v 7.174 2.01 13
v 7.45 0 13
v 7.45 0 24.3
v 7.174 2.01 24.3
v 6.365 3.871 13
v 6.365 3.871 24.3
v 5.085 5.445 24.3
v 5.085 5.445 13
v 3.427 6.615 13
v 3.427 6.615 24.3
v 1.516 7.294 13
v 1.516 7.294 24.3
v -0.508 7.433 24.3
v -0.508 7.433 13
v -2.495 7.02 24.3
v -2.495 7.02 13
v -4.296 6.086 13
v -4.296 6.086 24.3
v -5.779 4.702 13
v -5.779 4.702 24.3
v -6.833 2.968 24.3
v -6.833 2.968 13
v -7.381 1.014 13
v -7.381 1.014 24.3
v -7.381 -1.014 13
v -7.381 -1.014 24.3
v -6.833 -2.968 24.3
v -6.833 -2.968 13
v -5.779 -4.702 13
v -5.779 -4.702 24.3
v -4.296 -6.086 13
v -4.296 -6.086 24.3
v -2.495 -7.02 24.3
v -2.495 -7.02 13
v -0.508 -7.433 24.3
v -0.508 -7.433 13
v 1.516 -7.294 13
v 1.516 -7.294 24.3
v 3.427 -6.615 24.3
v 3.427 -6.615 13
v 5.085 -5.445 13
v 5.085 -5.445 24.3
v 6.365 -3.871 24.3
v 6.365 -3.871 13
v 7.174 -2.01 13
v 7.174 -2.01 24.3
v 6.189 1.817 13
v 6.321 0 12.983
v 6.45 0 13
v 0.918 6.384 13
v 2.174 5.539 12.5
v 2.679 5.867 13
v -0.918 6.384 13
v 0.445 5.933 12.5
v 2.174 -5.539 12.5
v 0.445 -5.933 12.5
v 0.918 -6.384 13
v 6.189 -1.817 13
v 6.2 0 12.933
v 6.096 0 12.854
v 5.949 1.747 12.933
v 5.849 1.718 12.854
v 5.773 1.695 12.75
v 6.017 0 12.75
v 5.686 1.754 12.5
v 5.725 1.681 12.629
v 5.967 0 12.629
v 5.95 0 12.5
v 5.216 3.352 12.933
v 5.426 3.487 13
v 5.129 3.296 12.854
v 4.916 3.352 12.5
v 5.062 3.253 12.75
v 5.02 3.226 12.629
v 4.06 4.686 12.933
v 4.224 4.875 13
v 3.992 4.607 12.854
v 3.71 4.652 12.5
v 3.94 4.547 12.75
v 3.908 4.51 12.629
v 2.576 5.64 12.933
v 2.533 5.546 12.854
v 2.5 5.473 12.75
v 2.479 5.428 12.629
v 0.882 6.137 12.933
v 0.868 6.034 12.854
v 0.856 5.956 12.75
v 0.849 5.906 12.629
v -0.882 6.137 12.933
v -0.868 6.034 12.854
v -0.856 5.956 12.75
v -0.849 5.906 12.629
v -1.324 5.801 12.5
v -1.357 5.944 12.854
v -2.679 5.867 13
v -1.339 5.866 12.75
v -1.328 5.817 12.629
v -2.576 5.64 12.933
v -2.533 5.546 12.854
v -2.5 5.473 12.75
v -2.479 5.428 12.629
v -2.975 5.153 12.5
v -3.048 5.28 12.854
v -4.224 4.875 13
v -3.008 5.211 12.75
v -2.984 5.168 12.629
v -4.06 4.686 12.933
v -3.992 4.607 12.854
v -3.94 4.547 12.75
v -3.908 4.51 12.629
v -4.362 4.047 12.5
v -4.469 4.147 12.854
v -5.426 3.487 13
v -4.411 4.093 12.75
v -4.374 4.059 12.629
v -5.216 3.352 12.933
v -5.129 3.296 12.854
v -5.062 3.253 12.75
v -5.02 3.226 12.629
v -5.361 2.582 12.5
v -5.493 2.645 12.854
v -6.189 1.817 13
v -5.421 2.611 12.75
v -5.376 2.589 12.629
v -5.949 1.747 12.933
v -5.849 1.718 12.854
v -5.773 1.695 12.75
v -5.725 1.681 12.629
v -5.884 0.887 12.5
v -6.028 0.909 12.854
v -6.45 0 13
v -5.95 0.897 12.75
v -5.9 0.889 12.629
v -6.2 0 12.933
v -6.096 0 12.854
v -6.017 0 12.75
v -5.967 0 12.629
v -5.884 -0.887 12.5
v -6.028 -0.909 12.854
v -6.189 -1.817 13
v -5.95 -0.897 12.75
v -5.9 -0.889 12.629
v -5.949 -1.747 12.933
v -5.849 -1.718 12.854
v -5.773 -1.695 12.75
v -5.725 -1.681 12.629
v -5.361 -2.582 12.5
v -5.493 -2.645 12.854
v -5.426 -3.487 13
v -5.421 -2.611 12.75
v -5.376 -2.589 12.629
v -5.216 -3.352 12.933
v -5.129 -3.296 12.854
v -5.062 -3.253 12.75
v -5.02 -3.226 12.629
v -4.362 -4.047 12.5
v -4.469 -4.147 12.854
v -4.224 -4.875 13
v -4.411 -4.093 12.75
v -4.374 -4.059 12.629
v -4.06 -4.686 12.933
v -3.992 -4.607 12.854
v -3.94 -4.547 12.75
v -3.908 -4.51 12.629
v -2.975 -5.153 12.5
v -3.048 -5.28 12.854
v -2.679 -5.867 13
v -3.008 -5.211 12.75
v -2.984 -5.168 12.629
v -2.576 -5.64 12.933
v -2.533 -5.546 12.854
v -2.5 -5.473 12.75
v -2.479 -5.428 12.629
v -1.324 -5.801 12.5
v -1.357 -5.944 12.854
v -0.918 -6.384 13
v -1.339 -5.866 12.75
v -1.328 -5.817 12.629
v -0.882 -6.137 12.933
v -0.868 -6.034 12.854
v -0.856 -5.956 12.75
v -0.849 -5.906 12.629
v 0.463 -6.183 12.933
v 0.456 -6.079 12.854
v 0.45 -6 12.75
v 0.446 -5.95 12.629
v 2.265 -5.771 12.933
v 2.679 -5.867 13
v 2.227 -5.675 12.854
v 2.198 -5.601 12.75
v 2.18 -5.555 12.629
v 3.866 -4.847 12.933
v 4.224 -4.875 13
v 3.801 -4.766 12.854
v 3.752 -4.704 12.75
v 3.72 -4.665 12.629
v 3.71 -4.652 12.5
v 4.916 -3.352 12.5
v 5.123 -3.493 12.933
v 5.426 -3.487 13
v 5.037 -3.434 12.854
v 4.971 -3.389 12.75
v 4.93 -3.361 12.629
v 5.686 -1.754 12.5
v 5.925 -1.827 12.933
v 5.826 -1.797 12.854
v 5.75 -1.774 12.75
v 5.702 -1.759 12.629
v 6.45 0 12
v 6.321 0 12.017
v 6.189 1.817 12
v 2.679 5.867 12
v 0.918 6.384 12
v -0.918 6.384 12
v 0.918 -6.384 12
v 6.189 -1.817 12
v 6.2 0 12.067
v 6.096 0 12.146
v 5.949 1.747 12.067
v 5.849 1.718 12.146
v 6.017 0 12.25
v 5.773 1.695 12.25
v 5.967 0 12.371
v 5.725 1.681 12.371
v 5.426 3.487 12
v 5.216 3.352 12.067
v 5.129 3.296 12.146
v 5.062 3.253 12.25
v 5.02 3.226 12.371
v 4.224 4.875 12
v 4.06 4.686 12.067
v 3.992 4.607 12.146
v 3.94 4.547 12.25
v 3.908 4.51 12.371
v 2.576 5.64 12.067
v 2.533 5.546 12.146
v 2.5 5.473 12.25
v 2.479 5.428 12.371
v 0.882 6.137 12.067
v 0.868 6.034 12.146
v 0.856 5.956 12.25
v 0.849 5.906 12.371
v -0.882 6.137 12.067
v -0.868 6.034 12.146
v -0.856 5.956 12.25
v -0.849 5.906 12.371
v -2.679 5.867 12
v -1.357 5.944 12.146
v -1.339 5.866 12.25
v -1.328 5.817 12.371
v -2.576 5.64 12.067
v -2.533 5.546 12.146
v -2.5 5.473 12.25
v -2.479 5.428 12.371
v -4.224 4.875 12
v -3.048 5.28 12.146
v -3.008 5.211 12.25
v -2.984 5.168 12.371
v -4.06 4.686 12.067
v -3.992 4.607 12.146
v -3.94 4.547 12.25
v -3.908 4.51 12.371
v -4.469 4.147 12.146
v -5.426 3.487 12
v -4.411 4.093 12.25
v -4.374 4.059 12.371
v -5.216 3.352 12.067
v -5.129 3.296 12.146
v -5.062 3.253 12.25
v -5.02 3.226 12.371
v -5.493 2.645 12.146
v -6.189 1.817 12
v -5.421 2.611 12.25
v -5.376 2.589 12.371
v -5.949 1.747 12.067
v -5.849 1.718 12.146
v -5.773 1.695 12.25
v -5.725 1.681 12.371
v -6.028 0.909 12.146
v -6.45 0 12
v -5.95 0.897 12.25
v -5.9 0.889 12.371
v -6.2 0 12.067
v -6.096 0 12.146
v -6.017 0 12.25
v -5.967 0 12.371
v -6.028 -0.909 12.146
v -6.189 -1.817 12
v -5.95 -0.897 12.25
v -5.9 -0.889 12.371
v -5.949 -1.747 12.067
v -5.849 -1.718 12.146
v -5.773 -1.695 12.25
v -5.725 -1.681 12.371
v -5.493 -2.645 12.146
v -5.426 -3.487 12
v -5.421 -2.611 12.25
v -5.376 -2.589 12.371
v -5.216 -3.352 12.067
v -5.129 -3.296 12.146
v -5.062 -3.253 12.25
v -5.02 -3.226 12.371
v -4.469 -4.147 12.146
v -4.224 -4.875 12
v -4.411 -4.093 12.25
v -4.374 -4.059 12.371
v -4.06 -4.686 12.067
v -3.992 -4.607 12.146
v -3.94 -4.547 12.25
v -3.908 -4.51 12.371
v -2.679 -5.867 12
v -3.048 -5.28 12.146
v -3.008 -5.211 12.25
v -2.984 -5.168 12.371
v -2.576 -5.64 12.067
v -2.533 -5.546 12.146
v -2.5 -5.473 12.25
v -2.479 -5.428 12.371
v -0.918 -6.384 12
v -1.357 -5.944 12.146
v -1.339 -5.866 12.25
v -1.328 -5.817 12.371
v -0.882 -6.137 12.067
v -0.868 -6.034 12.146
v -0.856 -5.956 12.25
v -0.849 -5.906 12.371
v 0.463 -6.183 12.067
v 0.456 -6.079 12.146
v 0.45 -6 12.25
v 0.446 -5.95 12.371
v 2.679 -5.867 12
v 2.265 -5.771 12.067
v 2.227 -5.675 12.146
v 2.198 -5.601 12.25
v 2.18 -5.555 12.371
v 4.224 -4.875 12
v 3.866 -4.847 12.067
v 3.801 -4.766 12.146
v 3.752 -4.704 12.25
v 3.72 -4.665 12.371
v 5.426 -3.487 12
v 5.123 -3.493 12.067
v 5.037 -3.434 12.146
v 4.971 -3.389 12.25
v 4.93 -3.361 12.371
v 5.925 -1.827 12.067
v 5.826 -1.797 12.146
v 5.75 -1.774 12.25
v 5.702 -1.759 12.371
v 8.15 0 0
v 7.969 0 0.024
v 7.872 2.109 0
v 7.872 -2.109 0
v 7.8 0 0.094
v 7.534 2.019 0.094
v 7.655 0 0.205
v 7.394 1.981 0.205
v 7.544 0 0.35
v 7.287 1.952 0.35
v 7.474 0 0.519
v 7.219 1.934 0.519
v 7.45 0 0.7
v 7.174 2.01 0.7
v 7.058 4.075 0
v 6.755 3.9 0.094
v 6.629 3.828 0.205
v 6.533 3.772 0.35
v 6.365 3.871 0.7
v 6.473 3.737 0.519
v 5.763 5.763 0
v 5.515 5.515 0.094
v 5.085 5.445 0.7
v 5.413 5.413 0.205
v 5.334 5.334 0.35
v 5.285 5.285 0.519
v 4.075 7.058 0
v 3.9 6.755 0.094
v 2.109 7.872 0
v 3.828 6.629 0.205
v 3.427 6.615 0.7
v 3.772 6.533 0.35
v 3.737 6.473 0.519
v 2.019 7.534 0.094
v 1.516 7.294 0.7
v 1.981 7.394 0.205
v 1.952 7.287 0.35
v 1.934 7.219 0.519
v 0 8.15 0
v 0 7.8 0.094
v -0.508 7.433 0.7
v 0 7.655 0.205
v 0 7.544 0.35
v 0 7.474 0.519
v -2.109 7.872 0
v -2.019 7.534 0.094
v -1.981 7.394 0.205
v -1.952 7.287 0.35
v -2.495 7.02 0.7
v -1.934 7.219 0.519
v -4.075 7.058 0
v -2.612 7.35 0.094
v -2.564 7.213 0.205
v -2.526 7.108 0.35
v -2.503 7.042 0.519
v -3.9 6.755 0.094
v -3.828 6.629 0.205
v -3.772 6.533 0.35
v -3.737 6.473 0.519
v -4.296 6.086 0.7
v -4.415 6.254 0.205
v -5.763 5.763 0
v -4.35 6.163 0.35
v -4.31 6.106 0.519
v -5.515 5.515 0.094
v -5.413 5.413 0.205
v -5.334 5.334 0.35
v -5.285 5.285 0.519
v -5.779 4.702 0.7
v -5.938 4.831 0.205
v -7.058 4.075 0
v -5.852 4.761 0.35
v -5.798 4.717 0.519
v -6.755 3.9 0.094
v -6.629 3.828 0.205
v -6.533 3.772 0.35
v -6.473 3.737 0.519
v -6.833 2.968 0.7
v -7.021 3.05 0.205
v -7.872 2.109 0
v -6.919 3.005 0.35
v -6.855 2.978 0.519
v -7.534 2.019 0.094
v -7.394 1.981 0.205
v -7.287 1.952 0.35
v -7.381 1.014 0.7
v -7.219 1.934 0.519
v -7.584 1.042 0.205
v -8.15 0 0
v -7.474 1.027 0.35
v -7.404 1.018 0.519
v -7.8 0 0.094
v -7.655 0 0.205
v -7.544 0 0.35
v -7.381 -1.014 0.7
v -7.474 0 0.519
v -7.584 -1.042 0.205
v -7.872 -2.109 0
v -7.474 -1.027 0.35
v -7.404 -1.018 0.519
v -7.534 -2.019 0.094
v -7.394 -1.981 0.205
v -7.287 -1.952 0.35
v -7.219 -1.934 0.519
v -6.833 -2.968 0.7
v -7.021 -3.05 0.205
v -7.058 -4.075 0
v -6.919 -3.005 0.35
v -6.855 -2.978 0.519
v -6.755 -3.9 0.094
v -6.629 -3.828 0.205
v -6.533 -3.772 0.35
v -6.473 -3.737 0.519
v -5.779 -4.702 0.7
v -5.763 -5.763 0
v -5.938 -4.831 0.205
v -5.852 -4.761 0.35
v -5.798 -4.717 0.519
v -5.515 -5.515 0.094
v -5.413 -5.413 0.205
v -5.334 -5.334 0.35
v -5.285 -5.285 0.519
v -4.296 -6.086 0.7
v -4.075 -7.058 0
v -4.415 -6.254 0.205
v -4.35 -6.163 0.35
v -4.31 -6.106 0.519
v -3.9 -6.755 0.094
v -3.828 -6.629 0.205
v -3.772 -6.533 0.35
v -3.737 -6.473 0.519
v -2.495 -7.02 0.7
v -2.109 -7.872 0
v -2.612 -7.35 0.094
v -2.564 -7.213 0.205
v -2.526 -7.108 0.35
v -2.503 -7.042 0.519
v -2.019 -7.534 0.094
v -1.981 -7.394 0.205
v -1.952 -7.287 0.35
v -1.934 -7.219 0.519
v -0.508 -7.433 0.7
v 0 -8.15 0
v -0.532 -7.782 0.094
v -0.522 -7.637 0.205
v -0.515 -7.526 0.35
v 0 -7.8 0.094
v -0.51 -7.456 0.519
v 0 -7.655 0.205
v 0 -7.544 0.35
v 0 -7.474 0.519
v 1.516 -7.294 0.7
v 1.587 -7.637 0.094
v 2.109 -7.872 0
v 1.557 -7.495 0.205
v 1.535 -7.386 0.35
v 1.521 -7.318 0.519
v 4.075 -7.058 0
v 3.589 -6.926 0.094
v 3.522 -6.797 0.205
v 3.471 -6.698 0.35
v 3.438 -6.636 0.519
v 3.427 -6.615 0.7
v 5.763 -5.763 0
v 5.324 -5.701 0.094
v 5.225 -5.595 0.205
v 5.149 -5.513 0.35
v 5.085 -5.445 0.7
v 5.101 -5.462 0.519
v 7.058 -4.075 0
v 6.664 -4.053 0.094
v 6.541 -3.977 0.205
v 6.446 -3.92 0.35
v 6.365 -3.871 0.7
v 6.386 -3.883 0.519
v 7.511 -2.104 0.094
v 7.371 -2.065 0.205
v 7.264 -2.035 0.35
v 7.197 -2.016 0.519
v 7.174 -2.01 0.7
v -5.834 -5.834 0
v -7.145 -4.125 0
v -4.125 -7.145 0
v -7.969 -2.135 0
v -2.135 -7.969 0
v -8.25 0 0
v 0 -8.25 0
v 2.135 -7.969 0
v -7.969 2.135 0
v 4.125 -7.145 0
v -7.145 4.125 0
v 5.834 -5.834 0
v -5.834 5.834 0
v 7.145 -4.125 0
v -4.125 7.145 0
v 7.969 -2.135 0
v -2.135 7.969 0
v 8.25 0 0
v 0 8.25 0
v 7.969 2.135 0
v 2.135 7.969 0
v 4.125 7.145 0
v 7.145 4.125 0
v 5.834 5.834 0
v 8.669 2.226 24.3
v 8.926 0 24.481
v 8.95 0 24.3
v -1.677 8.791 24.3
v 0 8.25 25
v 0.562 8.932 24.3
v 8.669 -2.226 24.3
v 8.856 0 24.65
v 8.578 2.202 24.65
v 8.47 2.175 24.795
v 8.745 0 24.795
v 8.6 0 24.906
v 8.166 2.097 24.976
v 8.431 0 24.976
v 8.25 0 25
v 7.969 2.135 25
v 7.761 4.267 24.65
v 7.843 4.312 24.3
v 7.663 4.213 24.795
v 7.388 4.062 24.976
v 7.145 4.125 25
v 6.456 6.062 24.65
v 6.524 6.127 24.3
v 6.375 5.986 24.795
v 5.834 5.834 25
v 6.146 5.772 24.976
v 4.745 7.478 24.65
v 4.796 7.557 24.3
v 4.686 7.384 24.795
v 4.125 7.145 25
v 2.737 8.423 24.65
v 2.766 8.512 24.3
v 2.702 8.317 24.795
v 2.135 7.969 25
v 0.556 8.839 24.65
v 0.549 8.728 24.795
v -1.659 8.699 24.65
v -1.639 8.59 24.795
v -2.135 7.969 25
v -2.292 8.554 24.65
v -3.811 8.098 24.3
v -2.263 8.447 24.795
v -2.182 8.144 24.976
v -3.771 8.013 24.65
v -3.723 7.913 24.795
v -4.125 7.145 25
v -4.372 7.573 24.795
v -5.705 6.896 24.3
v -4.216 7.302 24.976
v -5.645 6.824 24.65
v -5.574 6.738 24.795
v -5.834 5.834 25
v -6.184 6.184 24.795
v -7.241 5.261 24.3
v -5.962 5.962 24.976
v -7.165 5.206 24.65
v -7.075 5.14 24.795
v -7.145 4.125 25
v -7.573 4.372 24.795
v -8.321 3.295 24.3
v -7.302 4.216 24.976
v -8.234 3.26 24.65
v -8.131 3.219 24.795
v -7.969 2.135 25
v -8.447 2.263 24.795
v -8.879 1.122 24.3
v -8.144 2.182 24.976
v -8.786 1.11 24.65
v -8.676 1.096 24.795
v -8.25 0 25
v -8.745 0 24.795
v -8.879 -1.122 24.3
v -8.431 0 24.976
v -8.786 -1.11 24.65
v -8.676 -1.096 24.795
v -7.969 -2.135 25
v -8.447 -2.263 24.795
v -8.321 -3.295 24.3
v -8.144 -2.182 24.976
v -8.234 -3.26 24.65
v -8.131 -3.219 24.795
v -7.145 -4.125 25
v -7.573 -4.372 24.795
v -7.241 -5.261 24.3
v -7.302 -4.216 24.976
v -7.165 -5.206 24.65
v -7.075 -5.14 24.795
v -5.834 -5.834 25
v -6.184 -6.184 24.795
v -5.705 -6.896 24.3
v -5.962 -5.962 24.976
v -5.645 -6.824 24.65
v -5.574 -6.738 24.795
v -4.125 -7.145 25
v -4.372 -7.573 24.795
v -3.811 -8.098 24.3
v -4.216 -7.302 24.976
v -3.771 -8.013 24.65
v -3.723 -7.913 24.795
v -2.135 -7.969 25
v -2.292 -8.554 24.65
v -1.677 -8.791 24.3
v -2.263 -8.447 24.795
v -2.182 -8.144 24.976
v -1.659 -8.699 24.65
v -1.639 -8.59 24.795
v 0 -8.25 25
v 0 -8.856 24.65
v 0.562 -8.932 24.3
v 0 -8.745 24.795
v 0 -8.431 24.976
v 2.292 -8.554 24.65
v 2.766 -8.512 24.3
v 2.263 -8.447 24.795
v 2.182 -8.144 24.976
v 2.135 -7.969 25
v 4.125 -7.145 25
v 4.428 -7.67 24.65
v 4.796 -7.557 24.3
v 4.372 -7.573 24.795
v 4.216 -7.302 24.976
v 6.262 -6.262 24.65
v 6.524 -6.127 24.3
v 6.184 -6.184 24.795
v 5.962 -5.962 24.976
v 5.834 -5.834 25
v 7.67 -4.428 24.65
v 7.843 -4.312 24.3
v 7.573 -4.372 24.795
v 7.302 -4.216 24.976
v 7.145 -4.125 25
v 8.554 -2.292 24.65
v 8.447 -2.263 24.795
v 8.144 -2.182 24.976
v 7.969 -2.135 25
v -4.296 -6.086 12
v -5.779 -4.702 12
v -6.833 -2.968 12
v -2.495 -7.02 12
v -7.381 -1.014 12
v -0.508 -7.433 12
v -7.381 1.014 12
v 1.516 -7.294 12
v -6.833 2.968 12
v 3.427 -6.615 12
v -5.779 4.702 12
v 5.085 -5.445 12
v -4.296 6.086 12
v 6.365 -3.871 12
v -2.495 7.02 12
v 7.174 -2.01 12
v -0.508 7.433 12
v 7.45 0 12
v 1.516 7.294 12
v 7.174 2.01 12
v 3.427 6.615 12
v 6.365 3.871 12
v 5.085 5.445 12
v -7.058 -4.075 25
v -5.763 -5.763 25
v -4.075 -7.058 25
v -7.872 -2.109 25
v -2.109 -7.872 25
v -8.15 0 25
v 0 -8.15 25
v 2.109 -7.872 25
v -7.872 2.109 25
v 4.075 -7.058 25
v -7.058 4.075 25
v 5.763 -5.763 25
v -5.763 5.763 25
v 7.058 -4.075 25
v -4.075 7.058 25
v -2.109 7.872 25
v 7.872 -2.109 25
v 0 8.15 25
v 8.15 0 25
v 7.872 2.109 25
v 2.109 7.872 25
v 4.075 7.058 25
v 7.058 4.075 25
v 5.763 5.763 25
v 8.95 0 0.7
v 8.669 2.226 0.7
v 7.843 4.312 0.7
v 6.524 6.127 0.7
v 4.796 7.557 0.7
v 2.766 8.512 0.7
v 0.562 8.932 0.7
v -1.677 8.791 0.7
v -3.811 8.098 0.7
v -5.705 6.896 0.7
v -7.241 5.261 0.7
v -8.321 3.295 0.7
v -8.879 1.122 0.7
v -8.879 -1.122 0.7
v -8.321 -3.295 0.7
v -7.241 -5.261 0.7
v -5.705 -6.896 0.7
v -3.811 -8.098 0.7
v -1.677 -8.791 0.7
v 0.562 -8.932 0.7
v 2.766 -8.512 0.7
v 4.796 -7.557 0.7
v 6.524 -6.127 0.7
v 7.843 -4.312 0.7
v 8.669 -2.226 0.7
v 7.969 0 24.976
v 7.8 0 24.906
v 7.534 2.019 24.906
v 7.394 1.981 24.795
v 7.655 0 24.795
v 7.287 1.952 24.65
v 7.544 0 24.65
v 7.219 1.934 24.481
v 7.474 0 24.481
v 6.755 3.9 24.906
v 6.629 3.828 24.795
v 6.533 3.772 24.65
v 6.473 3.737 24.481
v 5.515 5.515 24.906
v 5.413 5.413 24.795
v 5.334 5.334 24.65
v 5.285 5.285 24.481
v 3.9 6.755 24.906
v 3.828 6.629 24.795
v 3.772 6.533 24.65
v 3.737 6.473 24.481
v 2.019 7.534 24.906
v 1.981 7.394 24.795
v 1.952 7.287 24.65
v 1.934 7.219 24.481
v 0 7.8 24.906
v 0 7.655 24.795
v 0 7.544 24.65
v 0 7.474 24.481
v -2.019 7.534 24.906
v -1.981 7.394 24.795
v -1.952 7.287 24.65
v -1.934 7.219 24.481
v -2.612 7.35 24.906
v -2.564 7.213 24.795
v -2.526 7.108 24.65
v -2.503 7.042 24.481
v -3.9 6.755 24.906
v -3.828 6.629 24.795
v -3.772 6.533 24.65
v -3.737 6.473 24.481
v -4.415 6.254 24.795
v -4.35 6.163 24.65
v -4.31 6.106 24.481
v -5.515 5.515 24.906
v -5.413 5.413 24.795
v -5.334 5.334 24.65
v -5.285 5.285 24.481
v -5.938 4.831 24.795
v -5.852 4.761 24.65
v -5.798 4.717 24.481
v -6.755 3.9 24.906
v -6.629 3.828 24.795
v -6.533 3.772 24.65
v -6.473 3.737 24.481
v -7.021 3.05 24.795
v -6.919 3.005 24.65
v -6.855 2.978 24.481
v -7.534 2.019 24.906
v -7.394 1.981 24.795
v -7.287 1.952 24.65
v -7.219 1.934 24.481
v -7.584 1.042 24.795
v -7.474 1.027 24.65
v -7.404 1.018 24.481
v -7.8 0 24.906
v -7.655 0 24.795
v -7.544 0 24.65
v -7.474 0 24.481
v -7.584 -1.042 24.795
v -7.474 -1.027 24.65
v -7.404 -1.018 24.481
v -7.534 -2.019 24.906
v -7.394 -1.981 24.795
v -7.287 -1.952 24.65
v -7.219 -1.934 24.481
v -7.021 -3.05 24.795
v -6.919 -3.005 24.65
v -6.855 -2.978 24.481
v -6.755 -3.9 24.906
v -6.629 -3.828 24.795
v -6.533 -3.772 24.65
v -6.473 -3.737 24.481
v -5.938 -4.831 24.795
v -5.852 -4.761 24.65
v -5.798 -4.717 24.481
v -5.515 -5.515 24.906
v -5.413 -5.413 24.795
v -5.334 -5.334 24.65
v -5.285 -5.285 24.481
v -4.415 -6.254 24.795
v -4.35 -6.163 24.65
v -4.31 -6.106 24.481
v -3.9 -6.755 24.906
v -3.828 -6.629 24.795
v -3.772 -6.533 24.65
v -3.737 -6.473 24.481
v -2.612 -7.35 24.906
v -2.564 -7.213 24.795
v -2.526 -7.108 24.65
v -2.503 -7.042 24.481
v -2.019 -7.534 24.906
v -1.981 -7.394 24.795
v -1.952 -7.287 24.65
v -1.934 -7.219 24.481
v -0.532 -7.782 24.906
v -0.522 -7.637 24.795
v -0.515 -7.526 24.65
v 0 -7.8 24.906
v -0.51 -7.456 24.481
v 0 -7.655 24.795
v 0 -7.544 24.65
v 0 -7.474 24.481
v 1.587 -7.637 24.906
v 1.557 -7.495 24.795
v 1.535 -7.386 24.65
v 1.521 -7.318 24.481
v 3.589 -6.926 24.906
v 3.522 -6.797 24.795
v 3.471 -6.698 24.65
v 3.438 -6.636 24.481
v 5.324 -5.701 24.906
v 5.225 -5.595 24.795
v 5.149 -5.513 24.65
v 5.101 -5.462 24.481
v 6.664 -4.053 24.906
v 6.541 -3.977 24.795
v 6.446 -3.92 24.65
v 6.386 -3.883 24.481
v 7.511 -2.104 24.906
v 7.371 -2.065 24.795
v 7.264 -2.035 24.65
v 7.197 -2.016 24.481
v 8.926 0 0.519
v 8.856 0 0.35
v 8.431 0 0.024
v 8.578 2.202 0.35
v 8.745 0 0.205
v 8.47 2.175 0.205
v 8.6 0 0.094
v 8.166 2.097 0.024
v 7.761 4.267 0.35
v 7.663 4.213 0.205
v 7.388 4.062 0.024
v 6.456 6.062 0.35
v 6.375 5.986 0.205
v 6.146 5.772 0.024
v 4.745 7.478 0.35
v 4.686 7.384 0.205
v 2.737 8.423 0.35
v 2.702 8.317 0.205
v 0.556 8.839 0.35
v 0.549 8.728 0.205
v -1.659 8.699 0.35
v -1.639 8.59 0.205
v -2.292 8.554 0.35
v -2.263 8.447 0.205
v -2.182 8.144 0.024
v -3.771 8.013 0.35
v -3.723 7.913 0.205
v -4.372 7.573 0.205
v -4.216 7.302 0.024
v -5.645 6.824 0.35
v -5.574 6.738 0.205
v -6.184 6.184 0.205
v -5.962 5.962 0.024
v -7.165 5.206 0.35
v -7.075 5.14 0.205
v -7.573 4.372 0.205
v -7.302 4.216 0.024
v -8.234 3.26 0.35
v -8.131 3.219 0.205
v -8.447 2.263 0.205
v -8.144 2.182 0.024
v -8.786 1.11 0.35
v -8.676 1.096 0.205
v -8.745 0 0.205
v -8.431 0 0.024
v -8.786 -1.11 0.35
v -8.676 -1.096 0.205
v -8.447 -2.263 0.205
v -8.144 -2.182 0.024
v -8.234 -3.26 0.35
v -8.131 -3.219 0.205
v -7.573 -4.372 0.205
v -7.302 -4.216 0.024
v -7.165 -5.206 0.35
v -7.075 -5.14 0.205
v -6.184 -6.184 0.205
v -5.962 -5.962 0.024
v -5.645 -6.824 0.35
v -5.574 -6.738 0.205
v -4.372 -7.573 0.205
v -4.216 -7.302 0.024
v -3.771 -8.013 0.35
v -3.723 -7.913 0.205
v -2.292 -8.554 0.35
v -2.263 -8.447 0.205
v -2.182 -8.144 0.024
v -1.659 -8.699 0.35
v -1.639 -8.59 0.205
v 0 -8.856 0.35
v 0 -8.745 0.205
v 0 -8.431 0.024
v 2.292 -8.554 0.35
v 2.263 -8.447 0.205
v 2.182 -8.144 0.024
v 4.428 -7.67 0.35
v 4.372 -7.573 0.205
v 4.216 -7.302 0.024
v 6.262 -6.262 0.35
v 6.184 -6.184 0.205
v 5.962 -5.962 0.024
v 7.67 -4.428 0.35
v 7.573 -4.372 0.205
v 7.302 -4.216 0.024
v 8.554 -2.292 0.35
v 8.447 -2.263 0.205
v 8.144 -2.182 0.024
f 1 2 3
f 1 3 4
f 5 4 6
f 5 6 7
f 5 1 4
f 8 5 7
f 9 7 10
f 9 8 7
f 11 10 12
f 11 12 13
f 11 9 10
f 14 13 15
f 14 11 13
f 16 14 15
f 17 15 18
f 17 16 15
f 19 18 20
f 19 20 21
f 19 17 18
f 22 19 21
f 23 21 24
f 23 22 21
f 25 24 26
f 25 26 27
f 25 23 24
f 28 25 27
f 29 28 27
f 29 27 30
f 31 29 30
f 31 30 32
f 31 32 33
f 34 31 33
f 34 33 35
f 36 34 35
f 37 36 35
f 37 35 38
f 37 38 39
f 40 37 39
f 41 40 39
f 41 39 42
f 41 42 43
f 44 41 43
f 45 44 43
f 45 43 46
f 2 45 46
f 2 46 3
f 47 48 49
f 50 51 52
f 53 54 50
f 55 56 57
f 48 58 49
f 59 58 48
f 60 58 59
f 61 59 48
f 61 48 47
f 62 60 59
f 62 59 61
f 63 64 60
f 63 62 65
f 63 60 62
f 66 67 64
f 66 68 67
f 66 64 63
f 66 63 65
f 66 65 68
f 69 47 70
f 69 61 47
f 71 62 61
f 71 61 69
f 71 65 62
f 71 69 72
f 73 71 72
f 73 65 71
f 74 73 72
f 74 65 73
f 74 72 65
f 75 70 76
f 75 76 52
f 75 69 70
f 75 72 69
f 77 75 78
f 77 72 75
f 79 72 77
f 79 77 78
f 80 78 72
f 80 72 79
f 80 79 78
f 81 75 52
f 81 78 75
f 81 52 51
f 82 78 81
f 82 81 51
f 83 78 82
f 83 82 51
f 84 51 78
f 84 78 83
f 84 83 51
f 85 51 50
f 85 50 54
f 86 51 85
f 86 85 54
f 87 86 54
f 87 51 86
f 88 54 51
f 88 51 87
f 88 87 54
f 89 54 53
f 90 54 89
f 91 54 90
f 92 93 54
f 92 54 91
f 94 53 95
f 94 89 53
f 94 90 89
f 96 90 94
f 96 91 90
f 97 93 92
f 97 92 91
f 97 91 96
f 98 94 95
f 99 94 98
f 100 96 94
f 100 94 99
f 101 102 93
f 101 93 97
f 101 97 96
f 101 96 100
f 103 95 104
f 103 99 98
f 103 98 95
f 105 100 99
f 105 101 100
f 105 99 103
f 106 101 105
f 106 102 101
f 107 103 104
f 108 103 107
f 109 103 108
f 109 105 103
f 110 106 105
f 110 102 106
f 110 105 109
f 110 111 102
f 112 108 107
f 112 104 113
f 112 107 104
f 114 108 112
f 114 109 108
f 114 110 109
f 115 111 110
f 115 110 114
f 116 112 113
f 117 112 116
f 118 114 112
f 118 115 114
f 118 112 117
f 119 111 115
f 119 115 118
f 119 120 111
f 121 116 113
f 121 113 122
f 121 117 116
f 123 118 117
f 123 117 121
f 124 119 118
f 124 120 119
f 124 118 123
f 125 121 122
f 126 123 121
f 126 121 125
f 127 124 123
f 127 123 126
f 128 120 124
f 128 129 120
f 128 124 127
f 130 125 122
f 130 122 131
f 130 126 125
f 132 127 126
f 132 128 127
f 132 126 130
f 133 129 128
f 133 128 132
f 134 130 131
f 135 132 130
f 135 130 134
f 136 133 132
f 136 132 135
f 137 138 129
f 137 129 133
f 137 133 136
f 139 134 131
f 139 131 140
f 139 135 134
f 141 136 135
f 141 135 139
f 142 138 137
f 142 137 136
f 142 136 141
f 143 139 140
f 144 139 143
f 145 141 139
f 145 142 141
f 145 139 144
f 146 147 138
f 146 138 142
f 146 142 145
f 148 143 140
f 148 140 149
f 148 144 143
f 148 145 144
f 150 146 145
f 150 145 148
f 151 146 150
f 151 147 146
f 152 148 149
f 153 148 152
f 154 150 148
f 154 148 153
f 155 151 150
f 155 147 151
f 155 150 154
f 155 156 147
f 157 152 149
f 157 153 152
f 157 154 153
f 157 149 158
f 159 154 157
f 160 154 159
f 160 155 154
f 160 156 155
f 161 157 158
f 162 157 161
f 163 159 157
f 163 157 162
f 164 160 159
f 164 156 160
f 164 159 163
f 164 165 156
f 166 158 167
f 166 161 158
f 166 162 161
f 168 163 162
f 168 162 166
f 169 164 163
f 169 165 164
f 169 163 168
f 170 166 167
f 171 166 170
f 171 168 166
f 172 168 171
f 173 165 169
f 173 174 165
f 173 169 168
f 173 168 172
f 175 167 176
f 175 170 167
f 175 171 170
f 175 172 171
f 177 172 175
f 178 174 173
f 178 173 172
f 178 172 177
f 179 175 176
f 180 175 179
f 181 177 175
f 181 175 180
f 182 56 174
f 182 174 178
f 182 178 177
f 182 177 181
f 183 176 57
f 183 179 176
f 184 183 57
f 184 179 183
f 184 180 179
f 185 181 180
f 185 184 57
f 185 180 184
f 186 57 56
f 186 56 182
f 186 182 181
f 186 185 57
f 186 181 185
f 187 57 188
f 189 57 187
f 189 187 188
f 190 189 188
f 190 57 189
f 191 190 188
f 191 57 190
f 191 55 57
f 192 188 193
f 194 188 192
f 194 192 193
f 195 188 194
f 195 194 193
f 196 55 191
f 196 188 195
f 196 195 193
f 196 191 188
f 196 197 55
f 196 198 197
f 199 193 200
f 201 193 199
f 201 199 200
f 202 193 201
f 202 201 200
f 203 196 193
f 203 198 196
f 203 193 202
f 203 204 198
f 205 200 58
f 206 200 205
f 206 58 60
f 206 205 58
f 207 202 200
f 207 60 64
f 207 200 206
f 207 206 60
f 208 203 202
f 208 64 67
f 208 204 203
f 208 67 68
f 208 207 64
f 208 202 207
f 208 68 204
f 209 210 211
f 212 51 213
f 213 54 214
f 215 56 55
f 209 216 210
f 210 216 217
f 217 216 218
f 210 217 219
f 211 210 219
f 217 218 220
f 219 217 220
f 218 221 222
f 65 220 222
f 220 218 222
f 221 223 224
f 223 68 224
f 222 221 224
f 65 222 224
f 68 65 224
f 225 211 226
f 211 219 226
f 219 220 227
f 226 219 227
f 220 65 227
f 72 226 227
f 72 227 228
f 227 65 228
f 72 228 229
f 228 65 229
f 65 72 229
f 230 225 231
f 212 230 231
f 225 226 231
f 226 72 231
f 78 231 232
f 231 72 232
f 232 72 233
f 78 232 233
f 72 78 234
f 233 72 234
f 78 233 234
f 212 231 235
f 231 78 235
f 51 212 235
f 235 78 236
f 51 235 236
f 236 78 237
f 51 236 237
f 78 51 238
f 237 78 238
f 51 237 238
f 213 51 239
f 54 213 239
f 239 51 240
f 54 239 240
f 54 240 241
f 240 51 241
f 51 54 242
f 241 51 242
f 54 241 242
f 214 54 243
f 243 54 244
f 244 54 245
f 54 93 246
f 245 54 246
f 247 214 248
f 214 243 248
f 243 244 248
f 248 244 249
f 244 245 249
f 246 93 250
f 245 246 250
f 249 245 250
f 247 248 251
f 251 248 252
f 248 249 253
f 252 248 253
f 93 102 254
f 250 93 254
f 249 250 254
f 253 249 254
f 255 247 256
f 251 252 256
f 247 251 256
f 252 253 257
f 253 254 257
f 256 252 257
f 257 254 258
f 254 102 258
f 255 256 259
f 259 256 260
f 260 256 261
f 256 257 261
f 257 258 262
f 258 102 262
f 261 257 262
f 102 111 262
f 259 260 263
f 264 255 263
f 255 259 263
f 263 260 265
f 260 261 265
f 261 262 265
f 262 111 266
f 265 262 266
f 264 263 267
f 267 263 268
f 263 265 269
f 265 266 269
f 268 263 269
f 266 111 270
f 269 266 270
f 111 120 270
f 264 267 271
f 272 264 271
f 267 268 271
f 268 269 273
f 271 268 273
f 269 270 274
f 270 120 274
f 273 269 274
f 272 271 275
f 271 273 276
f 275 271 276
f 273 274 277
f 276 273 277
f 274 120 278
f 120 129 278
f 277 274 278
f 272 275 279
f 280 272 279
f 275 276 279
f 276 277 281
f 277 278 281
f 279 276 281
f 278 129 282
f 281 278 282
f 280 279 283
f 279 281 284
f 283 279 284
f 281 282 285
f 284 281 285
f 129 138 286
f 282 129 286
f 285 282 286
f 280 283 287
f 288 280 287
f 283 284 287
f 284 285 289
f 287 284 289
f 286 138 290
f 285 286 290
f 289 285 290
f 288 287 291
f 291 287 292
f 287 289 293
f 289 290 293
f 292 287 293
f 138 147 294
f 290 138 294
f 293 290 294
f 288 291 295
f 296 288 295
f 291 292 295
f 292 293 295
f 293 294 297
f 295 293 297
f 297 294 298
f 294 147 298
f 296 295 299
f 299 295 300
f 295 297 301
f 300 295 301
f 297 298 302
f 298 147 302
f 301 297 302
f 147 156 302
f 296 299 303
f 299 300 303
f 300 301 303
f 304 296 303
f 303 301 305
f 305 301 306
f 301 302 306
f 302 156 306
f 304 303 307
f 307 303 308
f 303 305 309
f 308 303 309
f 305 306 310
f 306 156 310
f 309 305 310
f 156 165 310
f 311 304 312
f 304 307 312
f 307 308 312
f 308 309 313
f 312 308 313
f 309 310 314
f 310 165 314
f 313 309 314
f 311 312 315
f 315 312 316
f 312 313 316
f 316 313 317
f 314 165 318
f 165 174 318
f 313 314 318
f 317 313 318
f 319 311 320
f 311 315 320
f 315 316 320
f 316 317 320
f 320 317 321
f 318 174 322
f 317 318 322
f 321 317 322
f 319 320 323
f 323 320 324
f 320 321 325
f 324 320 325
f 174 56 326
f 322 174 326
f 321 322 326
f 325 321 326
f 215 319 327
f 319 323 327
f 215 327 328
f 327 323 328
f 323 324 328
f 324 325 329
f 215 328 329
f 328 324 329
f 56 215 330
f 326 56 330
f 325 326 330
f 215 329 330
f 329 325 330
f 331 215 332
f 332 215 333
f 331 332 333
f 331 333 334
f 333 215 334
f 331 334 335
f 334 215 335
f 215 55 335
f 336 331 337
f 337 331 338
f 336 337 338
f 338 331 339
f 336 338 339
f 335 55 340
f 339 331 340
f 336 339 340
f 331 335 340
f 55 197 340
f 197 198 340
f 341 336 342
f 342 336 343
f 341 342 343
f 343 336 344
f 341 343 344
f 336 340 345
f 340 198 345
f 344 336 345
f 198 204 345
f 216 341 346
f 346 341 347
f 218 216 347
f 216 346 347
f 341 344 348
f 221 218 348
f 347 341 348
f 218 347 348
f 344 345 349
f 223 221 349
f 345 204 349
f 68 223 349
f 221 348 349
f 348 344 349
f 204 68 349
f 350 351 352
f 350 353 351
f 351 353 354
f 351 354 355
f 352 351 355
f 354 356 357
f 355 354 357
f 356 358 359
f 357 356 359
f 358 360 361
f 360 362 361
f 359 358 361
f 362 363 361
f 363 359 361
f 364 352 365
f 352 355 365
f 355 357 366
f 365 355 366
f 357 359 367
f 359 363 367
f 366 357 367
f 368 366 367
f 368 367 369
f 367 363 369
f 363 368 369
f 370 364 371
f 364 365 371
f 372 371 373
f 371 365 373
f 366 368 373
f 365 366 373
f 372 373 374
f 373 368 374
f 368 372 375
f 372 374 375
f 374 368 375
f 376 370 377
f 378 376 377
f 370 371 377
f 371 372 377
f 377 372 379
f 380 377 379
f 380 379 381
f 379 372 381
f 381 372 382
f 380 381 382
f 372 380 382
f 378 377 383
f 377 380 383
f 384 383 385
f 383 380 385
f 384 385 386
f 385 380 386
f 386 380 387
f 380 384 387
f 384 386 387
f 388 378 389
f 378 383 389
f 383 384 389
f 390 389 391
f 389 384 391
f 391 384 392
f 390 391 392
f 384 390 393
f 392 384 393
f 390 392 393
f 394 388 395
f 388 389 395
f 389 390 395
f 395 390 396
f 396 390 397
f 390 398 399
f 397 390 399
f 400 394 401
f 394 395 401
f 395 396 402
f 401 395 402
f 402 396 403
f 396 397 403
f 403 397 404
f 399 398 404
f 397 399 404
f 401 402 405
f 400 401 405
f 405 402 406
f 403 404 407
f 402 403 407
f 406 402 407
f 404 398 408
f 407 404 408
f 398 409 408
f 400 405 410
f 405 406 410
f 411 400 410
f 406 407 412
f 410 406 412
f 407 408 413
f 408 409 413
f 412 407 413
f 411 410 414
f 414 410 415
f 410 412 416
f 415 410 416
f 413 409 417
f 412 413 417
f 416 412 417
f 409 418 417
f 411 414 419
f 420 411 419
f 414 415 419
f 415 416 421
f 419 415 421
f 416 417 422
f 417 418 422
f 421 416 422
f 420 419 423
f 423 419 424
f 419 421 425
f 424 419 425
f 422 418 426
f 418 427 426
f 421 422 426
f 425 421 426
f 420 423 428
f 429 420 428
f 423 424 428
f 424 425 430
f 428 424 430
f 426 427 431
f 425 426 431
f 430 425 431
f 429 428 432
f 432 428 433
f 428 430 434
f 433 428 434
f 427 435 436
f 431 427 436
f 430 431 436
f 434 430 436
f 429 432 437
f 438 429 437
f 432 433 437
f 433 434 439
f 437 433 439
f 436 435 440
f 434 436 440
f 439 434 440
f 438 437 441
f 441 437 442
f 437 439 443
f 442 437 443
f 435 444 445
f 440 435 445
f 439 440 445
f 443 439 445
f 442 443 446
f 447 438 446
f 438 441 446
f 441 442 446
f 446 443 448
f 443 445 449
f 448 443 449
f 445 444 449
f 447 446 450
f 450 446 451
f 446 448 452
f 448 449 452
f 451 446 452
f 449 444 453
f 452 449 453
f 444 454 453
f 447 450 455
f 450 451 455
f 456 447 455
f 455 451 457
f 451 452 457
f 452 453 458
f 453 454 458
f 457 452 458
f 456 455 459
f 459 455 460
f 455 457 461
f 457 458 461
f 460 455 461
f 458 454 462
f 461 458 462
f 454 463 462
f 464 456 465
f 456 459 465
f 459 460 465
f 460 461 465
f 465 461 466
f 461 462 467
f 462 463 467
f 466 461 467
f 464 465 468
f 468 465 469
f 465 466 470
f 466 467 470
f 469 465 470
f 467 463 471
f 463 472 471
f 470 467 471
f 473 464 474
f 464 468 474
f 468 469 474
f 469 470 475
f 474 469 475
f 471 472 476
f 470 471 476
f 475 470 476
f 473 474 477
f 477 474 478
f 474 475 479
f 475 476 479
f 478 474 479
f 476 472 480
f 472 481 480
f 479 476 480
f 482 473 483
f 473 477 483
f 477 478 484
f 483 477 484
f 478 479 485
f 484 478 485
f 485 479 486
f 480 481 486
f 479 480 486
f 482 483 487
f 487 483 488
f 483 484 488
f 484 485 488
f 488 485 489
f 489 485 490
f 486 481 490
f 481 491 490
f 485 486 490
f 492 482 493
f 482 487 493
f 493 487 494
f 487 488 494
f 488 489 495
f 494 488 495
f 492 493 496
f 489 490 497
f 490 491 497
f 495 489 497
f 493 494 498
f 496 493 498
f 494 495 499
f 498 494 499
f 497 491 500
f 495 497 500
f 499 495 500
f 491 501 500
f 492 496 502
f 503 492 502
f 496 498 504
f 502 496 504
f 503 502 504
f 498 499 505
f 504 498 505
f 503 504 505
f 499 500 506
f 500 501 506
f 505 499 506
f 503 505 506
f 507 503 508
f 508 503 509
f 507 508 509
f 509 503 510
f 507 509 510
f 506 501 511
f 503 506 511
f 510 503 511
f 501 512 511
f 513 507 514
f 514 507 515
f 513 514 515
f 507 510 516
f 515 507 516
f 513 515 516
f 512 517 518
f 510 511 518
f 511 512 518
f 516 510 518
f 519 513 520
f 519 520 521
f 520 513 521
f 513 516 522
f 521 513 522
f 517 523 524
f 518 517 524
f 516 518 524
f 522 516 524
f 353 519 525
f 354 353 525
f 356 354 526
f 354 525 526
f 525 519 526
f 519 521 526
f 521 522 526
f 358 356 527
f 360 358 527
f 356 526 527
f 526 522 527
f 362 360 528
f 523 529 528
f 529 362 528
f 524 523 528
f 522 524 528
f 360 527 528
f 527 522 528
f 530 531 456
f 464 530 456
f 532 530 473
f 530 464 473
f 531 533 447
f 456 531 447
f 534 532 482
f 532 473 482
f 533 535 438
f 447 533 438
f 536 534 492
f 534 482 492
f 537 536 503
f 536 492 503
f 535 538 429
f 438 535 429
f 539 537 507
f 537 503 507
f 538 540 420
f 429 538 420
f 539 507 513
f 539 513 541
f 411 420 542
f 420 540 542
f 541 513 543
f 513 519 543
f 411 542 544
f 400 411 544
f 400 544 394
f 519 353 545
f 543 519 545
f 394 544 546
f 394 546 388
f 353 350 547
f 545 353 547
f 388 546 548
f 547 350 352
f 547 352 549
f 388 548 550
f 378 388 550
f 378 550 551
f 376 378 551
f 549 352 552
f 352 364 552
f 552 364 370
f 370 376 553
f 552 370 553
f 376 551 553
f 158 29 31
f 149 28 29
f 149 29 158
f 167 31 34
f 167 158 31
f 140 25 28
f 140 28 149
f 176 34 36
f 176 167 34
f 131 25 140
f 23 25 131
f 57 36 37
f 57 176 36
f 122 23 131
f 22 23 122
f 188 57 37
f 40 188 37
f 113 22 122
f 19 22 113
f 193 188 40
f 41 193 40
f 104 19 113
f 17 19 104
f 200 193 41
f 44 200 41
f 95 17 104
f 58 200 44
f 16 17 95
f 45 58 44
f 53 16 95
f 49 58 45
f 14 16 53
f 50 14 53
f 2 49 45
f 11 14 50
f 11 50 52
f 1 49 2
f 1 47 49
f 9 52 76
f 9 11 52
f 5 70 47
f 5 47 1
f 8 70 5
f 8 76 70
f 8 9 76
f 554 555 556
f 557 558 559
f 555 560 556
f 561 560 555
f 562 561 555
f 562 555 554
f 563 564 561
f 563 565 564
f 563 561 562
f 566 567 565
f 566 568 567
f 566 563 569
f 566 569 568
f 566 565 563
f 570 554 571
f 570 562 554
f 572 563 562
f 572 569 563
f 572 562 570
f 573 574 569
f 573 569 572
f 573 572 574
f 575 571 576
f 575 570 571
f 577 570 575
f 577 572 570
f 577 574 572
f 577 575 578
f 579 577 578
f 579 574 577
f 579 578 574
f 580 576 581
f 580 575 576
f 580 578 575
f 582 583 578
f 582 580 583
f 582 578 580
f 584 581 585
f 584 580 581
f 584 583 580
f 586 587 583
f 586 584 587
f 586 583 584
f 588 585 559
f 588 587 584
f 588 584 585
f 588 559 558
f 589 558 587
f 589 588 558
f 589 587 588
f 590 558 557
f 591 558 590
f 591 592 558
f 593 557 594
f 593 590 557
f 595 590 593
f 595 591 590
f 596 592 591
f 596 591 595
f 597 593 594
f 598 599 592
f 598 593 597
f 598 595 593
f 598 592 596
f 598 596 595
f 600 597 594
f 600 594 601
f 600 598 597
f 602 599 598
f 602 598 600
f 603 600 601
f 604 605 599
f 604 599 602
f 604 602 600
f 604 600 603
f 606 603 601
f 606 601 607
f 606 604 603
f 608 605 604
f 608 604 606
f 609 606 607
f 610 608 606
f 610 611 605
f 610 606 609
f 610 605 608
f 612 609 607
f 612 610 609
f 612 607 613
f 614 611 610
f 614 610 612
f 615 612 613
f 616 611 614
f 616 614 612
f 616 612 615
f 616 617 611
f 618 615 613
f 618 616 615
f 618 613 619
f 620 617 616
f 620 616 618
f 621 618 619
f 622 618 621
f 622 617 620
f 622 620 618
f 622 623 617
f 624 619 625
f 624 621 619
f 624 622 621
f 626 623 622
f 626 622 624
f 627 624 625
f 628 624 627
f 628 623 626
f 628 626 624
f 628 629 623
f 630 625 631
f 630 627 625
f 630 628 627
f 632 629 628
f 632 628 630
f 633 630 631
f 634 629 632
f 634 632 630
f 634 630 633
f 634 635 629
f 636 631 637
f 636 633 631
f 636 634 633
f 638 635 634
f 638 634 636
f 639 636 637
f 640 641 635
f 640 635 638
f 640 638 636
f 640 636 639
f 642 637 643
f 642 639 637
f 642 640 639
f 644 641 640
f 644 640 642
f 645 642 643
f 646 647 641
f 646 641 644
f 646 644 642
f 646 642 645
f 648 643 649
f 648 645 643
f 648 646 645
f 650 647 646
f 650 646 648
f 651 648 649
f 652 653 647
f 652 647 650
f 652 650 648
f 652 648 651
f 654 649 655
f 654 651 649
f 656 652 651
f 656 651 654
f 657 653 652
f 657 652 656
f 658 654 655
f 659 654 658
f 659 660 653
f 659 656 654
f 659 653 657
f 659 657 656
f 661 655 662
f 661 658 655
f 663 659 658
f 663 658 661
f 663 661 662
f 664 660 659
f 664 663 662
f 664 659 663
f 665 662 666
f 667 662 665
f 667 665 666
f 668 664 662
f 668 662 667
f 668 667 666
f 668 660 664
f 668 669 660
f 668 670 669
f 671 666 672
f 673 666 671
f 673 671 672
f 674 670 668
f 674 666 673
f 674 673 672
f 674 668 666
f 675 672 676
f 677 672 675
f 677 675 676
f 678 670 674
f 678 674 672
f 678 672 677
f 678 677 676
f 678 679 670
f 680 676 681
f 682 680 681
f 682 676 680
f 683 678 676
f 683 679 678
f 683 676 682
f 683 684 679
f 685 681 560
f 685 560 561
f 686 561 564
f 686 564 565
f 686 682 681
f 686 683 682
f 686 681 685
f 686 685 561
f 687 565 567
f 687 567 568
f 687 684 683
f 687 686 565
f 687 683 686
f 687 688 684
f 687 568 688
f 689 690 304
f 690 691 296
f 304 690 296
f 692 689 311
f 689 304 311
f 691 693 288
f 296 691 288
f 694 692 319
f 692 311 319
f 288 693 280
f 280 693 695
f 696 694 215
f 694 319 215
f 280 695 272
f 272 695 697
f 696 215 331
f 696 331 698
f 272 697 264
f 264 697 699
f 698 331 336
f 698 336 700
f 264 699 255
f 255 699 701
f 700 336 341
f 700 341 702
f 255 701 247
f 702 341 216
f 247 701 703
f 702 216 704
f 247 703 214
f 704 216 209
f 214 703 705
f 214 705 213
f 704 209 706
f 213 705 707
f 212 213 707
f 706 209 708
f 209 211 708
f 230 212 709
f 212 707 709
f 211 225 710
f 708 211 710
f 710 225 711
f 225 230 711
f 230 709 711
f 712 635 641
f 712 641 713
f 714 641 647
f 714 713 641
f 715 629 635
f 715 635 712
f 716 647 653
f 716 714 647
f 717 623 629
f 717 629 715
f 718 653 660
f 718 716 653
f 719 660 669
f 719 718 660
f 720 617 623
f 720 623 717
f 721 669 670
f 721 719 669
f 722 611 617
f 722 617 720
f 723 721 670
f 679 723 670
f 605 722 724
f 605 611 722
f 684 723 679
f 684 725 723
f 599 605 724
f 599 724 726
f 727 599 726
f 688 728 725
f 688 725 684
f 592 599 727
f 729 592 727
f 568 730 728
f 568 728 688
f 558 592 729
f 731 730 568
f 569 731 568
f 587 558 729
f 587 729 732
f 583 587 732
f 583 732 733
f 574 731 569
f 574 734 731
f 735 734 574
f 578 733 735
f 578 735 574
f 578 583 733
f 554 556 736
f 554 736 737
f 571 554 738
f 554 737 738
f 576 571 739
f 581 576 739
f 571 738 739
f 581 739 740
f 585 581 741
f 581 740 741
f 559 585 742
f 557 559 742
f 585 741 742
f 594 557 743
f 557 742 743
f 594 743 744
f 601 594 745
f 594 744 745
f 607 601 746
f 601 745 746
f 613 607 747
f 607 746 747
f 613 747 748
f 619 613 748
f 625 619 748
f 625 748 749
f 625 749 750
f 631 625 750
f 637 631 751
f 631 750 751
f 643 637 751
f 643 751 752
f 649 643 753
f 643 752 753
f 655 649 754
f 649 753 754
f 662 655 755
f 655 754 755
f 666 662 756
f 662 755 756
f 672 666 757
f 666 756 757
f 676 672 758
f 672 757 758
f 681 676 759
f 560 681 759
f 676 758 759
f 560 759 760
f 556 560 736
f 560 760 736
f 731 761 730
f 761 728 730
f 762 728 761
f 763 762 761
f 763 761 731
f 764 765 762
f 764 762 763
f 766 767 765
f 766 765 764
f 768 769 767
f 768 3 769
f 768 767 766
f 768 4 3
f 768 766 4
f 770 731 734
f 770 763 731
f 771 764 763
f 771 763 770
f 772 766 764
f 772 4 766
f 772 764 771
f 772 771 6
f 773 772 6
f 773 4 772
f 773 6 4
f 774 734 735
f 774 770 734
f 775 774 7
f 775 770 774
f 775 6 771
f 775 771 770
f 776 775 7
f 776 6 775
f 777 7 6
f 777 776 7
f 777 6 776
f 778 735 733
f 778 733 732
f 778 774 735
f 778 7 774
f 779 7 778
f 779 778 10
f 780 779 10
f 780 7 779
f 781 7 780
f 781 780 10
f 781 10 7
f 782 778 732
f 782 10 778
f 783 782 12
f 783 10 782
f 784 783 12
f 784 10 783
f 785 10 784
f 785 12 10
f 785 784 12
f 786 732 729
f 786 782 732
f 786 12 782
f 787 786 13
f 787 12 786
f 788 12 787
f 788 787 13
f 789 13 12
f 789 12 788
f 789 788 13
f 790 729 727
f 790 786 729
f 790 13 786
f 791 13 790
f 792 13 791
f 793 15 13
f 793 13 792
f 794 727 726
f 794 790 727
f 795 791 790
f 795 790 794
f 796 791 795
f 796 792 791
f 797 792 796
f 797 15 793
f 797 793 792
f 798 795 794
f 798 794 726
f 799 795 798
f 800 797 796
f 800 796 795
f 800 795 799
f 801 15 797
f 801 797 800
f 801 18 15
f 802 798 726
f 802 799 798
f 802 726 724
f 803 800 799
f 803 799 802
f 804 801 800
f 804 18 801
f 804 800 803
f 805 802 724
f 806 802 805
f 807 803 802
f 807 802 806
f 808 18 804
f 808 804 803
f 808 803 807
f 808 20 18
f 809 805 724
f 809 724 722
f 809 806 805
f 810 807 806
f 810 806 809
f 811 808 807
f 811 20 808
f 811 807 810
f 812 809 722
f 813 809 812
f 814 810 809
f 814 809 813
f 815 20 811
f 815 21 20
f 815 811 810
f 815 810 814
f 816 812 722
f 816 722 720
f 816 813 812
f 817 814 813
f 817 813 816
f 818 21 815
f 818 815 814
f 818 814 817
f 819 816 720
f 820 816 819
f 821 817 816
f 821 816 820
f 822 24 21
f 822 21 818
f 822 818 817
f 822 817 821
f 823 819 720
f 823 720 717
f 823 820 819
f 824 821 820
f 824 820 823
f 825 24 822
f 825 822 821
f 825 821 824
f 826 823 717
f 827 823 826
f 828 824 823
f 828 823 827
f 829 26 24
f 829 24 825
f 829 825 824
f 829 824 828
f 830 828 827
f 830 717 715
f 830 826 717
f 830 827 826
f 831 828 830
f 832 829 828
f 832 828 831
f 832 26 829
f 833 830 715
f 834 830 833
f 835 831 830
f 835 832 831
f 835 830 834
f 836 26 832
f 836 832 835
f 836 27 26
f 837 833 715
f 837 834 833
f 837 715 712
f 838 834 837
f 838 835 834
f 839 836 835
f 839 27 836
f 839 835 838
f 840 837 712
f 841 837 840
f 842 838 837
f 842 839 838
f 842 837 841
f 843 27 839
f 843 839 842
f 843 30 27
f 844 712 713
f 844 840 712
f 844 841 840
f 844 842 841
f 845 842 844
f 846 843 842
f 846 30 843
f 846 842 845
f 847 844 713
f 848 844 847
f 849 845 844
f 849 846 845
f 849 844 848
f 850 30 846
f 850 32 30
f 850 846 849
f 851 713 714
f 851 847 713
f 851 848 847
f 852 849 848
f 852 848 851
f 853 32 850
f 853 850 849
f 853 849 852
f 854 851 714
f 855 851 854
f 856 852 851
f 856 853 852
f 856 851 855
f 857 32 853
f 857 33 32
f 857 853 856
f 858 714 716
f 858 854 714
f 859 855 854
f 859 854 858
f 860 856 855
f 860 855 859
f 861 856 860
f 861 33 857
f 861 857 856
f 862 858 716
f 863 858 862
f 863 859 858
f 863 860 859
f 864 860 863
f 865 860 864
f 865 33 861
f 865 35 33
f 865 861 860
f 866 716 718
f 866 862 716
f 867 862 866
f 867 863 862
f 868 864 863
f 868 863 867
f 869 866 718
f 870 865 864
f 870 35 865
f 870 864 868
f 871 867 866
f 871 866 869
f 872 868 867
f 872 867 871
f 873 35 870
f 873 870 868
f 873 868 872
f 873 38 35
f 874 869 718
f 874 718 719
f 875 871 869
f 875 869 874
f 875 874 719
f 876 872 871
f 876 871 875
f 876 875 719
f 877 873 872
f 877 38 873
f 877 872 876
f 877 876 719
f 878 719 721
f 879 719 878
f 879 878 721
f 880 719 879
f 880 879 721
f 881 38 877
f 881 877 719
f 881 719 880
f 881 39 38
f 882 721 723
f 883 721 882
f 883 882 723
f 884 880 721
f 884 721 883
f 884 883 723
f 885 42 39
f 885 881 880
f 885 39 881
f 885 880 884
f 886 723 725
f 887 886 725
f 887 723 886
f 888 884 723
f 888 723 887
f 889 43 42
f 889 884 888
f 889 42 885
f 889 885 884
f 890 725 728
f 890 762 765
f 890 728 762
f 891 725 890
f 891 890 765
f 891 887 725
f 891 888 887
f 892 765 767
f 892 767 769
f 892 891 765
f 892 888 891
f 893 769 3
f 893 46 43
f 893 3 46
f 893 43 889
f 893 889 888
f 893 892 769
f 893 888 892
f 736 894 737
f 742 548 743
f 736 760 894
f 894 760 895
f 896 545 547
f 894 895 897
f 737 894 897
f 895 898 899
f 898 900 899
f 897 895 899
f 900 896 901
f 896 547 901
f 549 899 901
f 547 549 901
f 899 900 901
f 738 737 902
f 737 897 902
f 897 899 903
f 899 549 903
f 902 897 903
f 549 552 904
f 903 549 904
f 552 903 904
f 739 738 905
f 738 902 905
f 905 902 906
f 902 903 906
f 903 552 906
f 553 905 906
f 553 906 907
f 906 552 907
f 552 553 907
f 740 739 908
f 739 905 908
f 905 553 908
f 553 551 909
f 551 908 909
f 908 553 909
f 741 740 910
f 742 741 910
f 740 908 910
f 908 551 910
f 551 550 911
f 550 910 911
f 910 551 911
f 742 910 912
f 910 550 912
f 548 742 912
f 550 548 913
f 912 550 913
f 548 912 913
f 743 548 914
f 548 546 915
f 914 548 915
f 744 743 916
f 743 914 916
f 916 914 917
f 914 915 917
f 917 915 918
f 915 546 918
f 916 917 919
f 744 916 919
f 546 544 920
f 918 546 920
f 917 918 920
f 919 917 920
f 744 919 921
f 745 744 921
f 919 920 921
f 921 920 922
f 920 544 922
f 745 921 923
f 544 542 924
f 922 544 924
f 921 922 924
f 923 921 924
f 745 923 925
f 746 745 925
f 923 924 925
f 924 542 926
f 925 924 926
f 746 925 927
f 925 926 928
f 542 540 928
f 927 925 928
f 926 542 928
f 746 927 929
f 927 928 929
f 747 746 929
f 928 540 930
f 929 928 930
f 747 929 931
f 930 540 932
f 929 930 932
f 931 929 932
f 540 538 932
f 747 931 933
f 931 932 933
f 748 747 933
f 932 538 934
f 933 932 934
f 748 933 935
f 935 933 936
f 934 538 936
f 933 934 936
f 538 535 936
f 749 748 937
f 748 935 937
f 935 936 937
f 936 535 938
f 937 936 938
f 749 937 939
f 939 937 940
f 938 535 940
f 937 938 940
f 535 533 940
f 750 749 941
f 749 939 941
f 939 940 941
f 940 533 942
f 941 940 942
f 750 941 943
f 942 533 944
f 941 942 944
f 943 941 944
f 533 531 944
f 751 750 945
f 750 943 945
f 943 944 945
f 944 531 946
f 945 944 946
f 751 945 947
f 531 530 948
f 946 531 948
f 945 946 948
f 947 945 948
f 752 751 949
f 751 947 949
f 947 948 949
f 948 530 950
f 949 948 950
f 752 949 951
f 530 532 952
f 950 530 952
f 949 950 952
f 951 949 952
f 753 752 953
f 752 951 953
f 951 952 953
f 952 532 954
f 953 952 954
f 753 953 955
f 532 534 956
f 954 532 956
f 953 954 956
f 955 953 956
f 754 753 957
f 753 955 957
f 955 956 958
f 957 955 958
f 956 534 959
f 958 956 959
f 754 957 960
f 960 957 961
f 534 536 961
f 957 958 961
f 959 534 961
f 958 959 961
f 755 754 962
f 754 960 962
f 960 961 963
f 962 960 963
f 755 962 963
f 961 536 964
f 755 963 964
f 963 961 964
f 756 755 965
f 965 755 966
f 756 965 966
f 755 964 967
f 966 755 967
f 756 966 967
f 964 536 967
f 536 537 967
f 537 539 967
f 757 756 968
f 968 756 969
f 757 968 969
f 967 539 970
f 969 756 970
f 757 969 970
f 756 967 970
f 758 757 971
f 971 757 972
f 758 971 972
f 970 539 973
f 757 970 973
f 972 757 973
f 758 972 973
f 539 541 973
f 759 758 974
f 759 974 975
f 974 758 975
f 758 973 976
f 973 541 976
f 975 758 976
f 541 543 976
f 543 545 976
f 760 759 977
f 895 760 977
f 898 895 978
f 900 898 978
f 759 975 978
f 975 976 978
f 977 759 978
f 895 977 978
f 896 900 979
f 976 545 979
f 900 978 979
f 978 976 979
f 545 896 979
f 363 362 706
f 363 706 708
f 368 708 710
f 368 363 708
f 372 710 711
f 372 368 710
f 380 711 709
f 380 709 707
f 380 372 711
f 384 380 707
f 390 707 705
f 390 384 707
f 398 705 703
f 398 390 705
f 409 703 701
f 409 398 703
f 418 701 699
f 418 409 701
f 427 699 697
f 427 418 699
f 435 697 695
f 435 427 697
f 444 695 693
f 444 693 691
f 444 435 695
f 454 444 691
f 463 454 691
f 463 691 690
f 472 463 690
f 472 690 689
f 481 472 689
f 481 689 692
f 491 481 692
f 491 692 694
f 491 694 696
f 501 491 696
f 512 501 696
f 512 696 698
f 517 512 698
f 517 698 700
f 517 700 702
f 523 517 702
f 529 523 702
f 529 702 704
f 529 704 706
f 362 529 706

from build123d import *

# Parameters (mm, degrees)
F0_R     = 8.95
F0_R_2   = 7.45
F1_DEPTH = 25
F2_START = 12
F0_R_3   = 5.95
F2_DEPTH = 1
F3_R     = 0.7
F4_R     = 0.49999


# Not quite as in the source:
# - a fillet or chamfer is up to 0.001 mm smaller than in the source, because OpenCascade refuses the exact size


with BuildPart() as f1:
    # F0 (on Top) → F1 (new body)
    with BuildSketch(Plane.XY):
        Circle(F0_R)
        Circle(F0_R_2, mode=Mode.SUBTRACT)
    extrude(amount=F1_DEPTH)

    # F0 (on Top) → F2 (join)
    with BuildSketch(Plane.XY.offset(F2_START)):
        Circle(F0_R_2)
        Circle(F0_R_3, mode=Mode.SUBTRACT)
    extrude(amount=F2_DEPTH)

    # F3
    f3_edges = [f1.edges().sort_by_distance(p)[0] for p in [
        (-8.95, 0, 25),
        (-7.45, 0, 25),
        (-8.95, 0, 0),
        (-7.45, 0, 0),
    ]]
    fillet(f3_edges, radius=F3_R)

    # F4 (radius 0.5 in the source; OpenCascade refuses exactly that, so slightly less here)
    f4_edges = [f1.edges().sort_by_distance(p)[0] for p in [
        (5.95, 0, 12.5),
        (-5.95, 0, 12),
        (-5.95, 0, 13),
    ]]
    fillet(f4_edges, radius=F4_R)


solid = f1.part
